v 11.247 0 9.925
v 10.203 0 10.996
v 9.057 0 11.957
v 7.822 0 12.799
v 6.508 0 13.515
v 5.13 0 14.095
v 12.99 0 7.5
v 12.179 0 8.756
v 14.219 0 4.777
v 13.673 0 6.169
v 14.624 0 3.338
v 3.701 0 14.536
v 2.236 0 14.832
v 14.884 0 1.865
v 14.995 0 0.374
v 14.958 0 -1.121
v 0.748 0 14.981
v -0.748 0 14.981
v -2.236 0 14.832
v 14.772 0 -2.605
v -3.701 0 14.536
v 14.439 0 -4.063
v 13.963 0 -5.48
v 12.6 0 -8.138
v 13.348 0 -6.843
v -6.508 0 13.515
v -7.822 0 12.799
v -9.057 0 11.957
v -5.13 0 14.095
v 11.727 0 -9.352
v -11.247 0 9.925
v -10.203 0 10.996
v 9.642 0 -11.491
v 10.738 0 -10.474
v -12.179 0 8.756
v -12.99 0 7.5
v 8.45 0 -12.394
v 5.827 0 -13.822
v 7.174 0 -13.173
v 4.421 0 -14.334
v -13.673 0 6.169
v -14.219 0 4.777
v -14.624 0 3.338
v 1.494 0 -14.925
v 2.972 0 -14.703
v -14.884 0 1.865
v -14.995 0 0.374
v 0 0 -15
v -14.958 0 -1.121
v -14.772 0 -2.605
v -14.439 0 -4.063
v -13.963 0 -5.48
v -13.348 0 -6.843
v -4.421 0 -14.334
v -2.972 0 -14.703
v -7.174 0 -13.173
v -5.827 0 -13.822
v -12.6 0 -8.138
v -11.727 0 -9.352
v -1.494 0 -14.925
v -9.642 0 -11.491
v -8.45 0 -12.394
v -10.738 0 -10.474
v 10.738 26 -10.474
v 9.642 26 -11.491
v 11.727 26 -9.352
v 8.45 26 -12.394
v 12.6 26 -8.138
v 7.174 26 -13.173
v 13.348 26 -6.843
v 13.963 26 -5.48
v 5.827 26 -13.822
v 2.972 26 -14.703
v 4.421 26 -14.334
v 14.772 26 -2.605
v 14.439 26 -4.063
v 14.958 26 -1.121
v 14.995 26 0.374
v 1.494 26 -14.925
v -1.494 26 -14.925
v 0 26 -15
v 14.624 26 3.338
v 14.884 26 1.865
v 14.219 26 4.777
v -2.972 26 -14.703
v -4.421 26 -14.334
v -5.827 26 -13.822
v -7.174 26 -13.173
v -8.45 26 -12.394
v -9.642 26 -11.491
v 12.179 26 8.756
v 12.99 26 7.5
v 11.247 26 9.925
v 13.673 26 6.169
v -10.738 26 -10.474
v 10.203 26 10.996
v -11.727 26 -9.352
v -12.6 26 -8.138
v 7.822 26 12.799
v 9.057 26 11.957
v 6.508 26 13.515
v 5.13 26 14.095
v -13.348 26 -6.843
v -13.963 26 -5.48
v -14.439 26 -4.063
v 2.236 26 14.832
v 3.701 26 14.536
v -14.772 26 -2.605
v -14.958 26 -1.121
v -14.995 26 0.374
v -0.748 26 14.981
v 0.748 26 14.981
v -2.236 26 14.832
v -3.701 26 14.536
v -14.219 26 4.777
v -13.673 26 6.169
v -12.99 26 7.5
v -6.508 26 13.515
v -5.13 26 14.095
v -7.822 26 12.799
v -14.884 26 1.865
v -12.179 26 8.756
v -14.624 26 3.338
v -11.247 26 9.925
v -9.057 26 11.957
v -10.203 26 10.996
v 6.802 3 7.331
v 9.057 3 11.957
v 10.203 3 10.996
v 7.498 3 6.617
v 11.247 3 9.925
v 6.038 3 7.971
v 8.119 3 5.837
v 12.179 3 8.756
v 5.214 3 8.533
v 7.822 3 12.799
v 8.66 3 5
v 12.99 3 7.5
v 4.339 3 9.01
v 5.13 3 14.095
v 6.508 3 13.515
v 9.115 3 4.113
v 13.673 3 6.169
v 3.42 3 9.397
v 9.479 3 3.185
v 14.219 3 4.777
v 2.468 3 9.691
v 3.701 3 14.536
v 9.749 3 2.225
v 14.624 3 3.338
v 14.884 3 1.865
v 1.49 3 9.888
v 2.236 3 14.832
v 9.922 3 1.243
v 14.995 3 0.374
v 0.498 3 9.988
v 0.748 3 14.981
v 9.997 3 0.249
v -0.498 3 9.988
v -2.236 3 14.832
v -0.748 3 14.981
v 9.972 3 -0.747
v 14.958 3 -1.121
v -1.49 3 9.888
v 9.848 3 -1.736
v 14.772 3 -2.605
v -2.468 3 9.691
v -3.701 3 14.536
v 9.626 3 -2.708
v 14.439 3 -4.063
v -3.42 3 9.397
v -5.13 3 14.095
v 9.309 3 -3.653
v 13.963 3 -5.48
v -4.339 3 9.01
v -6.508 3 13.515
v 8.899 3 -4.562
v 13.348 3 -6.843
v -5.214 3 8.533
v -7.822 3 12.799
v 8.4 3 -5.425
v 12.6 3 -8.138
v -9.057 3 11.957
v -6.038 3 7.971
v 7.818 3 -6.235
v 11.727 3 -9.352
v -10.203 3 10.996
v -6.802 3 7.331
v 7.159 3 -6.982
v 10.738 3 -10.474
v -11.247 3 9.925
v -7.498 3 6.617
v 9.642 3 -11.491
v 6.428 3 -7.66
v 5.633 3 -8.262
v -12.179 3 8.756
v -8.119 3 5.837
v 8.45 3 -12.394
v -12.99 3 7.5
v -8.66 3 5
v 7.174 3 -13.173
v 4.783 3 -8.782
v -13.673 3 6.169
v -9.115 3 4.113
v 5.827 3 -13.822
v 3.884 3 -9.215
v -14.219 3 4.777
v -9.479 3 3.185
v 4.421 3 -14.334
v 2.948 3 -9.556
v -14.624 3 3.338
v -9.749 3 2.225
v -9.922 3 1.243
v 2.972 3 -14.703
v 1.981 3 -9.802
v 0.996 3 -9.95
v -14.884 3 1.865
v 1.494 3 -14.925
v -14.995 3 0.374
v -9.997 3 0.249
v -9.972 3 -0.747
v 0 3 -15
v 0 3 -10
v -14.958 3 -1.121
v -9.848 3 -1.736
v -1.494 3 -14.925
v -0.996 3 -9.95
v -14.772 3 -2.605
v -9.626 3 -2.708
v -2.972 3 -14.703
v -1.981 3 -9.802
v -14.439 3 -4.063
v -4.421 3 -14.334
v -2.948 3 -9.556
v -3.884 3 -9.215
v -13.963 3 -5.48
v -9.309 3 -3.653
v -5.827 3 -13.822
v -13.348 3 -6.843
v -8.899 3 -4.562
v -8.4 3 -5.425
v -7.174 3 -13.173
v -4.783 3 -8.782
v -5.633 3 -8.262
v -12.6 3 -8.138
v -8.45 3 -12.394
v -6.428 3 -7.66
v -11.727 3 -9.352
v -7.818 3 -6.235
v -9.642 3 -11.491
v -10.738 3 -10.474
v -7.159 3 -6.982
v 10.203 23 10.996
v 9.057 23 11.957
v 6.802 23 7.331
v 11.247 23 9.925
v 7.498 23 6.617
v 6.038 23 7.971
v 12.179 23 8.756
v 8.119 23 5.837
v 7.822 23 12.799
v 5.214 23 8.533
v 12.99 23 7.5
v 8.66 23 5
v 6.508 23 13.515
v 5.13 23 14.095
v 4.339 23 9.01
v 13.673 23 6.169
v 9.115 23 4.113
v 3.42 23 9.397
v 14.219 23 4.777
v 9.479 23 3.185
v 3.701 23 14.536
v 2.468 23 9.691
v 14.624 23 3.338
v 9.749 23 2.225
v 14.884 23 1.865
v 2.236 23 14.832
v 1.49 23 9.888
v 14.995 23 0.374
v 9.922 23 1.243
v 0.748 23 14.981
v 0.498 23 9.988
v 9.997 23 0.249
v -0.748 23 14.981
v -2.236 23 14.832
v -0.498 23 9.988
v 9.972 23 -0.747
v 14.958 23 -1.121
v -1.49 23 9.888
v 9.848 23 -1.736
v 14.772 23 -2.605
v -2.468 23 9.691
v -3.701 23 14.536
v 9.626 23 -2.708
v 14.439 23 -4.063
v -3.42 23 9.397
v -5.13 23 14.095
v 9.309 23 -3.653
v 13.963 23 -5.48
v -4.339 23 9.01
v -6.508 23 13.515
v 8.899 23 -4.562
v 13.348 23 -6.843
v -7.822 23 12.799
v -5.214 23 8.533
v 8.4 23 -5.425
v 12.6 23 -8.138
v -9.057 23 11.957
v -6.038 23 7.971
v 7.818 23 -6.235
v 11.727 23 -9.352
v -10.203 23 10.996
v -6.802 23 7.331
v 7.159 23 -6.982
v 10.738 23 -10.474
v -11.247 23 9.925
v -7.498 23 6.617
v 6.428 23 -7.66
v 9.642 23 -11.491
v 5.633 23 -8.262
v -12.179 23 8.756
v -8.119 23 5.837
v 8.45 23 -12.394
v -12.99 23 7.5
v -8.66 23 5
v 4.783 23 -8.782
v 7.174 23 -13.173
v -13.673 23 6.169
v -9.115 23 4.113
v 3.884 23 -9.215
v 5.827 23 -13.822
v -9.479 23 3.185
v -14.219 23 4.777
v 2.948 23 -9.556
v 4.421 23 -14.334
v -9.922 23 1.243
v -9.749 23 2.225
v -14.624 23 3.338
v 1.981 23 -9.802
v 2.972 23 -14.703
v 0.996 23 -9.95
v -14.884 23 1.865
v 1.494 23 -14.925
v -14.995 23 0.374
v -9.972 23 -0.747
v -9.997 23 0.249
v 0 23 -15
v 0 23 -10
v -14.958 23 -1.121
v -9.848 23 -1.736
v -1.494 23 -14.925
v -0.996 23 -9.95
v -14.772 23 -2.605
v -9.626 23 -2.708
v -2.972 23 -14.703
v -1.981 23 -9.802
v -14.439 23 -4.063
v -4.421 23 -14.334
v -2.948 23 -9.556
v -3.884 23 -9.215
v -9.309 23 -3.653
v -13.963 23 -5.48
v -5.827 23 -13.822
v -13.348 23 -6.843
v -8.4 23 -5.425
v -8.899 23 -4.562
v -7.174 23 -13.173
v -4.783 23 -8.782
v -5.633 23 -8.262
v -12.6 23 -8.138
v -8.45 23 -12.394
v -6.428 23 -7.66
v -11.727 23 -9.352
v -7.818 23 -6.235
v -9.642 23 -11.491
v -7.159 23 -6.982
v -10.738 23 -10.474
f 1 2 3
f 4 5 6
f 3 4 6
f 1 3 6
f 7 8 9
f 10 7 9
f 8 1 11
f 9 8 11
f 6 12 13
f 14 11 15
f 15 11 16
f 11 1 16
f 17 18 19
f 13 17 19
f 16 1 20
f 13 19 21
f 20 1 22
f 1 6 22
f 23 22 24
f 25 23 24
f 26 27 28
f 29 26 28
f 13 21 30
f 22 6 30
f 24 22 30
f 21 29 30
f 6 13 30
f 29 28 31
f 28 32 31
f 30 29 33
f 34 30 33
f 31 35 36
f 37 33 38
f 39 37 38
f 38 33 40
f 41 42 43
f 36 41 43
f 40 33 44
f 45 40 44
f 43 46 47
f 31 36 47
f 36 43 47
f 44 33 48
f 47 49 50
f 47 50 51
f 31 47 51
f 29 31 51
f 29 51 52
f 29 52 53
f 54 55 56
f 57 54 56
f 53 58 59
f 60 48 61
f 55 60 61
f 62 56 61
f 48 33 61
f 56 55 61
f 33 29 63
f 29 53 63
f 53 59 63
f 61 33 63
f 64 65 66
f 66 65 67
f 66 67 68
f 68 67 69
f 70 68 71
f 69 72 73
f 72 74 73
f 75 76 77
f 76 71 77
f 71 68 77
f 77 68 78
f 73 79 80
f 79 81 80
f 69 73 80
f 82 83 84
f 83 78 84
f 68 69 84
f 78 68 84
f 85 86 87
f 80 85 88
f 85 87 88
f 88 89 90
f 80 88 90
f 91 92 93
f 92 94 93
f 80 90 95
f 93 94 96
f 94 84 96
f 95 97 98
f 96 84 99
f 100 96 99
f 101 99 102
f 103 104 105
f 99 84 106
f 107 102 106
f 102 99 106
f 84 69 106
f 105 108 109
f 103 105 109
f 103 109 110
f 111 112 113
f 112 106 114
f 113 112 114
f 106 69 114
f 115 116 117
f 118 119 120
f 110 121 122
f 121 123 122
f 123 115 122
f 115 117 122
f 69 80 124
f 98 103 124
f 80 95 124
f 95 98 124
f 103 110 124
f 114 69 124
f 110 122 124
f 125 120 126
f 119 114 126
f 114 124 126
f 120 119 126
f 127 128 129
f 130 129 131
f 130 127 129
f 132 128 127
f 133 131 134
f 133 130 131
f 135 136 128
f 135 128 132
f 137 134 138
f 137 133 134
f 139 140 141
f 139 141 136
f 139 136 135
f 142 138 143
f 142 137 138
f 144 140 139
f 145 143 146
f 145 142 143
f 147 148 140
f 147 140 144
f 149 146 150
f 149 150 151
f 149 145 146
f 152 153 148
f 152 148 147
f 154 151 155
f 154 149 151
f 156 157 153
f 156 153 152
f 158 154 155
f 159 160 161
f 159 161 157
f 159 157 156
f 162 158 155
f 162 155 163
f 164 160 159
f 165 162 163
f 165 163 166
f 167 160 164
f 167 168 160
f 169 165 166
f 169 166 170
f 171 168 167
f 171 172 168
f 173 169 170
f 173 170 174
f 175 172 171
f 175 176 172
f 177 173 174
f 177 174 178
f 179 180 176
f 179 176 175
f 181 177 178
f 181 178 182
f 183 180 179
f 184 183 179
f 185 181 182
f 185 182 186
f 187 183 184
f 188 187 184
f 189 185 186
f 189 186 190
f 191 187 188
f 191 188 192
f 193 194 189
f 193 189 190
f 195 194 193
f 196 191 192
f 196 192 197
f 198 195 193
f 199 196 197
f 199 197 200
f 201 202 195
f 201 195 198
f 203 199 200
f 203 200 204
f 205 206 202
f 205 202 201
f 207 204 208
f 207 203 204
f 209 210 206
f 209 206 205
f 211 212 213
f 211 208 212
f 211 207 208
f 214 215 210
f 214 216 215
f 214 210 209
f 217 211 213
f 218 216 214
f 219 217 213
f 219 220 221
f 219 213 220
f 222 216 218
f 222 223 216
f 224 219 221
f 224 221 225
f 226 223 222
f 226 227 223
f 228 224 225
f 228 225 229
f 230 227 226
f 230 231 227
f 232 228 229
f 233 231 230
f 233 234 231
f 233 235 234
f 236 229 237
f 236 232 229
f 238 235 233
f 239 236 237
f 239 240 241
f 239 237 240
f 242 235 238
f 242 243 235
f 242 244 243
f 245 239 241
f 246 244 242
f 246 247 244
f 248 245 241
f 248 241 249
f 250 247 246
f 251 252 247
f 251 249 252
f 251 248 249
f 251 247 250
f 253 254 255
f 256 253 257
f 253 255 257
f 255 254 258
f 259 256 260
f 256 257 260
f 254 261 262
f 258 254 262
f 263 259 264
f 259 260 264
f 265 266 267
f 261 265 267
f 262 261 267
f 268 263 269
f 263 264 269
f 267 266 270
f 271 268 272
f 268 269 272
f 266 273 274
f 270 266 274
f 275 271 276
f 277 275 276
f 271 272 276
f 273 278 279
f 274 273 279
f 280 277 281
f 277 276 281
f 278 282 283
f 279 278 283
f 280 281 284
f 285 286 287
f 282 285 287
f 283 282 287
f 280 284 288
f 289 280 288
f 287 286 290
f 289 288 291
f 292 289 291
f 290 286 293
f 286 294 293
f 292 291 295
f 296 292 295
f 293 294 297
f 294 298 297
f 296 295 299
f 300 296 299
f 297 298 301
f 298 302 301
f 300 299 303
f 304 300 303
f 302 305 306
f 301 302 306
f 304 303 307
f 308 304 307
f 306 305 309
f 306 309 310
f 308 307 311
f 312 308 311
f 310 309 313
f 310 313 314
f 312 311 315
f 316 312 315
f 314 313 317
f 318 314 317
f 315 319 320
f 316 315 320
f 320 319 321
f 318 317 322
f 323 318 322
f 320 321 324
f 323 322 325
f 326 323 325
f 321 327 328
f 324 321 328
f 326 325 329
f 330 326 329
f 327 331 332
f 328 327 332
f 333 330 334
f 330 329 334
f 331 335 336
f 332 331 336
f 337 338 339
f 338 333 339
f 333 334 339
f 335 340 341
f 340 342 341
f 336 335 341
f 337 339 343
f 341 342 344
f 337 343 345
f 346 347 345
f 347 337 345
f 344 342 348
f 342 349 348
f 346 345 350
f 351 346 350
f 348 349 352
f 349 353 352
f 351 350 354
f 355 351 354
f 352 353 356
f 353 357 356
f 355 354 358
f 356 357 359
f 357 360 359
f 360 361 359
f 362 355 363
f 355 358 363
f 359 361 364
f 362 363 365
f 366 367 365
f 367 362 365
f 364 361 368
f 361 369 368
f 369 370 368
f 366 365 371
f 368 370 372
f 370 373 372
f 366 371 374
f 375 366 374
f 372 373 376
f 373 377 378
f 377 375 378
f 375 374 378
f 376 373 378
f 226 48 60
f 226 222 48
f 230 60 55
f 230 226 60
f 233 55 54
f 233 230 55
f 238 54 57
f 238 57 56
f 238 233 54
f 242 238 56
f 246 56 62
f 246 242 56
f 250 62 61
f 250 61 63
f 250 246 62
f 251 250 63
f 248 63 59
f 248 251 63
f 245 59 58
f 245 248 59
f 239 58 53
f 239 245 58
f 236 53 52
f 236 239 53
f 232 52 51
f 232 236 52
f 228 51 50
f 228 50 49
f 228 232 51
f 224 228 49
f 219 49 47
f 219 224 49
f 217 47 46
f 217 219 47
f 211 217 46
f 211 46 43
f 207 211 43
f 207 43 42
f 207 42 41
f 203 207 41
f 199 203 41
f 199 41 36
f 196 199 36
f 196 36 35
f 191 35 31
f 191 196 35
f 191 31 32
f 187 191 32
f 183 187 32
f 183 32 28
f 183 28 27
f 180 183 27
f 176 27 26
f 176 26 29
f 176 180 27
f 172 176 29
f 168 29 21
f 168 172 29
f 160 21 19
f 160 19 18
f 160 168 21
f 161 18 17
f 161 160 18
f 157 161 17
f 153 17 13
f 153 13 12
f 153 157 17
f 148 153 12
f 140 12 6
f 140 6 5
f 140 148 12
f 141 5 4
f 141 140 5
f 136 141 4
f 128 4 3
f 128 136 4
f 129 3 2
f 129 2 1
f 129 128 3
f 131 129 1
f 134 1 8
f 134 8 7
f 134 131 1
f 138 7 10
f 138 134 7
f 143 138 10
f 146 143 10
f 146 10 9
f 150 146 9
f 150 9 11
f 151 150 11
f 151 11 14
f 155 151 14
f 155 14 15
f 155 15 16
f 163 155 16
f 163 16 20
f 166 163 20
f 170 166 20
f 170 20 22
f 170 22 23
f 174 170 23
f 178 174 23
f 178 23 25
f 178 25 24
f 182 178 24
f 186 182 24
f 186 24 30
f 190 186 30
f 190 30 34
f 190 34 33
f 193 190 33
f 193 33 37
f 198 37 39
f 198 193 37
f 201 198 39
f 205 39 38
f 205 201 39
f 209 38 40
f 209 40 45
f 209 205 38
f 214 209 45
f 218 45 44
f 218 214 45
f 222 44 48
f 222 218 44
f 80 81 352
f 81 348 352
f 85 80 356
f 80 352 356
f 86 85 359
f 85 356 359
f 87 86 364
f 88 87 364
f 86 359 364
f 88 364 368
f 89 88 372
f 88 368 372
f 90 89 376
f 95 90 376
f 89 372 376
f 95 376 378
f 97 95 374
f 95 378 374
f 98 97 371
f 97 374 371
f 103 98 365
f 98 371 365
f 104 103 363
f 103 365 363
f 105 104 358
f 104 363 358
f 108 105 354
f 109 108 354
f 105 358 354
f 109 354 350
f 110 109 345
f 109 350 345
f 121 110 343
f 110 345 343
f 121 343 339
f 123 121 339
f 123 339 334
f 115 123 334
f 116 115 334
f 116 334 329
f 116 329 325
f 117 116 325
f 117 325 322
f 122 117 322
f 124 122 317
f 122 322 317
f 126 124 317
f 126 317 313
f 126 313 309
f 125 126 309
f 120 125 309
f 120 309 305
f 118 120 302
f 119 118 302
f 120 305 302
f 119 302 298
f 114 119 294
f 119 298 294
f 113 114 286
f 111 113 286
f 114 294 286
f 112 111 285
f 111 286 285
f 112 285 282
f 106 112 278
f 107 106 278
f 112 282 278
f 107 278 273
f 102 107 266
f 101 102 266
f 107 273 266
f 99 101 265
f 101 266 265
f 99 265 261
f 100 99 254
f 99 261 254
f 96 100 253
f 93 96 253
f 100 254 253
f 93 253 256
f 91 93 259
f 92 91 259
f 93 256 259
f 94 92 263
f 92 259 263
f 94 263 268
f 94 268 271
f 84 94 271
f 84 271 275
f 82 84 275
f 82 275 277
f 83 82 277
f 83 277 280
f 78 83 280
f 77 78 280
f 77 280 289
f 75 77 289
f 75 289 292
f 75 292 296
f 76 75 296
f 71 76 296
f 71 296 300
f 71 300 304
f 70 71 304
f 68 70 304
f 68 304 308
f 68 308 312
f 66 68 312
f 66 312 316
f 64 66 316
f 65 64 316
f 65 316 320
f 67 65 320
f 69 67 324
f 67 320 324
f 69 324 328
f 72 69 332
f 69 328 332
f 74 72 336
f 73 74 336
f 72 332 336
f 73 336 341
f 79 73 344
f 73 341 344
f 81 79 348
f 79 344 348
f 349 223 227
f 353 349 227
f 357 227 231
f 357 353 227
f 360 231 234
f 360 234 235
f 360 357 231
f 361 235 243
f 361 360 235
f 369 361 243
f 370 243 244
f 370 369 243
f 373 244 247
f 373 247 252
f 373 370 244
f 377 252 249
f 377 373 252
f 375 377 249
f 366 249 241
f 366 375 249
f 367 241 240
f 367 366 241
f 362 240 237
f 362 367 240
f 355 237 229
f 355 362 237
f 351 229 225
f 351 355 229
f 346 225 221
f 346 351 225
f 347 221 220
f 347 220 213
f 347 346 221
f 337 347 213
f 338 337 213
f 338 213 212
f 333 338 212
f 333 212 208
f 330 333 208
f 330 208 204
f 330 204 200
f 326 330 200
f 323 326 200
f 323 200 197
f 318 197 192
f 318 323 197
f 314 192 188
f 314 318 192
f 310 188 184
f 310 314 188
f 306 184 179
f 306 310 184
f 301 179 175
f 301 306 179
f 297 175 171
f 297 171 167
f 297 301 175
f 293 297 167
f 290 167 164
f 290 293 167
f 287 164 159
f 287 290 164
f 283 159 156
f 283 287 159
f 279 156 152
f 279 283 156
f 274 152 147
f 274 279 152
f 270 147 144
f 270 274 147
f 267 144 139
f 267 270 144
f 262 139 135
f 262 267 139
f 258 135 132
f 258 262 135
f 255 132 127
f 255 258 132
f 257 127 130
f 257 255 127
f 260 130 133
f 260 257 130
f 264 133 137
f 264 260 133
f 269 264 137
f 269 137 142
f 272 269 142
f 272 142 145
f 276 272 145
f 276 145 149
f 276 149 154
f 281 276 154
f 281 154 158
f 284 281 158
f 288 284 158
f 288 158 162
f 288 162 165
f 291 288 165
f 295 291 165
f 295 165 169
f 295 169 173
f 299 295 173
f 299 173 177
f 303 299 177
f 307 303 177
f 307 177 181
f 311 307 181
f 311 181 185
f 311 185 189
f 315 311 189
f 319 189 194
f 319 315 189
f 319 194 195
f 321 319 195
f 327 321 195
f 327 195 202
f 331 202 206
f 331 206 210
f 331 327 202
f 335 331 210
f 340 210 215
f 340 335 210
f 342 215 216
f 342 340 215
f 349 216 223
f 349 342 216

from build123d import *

# Parameters (mm, degrees)
SKETCH_1_W   = 15
SKETCH_1_H   = 3
SKETCH_1_W_2 = 10
SKETCH_1_H_2 = 20


with BuildPart() as part:
    # 草圖1 → 旋轉1 (revolve)
    with BuildSketch(Plane.XY, mode=Mode.PRIVATE) as revolve_1_sk:
        with Locations((-7.5, 1.5)):
            Rectangle(SKETCH_1_W, SKETCH_1_H)
        with Locations((-5, 13)):
            Rectangle(SKETCH_1_W_2, SKETCH_1_H_2)
        Polygon((-10, 23), (0, 23), (0, 26), (-15, 26), (-15, 23), align=None)
    revolve(revolve_1_sk.sketch.rotate(Axis((0, 0, 0), (0, 1, 0)), 270), axis=Axis((0, 0, 0), (0, 1, 0)))


solid = part.part
